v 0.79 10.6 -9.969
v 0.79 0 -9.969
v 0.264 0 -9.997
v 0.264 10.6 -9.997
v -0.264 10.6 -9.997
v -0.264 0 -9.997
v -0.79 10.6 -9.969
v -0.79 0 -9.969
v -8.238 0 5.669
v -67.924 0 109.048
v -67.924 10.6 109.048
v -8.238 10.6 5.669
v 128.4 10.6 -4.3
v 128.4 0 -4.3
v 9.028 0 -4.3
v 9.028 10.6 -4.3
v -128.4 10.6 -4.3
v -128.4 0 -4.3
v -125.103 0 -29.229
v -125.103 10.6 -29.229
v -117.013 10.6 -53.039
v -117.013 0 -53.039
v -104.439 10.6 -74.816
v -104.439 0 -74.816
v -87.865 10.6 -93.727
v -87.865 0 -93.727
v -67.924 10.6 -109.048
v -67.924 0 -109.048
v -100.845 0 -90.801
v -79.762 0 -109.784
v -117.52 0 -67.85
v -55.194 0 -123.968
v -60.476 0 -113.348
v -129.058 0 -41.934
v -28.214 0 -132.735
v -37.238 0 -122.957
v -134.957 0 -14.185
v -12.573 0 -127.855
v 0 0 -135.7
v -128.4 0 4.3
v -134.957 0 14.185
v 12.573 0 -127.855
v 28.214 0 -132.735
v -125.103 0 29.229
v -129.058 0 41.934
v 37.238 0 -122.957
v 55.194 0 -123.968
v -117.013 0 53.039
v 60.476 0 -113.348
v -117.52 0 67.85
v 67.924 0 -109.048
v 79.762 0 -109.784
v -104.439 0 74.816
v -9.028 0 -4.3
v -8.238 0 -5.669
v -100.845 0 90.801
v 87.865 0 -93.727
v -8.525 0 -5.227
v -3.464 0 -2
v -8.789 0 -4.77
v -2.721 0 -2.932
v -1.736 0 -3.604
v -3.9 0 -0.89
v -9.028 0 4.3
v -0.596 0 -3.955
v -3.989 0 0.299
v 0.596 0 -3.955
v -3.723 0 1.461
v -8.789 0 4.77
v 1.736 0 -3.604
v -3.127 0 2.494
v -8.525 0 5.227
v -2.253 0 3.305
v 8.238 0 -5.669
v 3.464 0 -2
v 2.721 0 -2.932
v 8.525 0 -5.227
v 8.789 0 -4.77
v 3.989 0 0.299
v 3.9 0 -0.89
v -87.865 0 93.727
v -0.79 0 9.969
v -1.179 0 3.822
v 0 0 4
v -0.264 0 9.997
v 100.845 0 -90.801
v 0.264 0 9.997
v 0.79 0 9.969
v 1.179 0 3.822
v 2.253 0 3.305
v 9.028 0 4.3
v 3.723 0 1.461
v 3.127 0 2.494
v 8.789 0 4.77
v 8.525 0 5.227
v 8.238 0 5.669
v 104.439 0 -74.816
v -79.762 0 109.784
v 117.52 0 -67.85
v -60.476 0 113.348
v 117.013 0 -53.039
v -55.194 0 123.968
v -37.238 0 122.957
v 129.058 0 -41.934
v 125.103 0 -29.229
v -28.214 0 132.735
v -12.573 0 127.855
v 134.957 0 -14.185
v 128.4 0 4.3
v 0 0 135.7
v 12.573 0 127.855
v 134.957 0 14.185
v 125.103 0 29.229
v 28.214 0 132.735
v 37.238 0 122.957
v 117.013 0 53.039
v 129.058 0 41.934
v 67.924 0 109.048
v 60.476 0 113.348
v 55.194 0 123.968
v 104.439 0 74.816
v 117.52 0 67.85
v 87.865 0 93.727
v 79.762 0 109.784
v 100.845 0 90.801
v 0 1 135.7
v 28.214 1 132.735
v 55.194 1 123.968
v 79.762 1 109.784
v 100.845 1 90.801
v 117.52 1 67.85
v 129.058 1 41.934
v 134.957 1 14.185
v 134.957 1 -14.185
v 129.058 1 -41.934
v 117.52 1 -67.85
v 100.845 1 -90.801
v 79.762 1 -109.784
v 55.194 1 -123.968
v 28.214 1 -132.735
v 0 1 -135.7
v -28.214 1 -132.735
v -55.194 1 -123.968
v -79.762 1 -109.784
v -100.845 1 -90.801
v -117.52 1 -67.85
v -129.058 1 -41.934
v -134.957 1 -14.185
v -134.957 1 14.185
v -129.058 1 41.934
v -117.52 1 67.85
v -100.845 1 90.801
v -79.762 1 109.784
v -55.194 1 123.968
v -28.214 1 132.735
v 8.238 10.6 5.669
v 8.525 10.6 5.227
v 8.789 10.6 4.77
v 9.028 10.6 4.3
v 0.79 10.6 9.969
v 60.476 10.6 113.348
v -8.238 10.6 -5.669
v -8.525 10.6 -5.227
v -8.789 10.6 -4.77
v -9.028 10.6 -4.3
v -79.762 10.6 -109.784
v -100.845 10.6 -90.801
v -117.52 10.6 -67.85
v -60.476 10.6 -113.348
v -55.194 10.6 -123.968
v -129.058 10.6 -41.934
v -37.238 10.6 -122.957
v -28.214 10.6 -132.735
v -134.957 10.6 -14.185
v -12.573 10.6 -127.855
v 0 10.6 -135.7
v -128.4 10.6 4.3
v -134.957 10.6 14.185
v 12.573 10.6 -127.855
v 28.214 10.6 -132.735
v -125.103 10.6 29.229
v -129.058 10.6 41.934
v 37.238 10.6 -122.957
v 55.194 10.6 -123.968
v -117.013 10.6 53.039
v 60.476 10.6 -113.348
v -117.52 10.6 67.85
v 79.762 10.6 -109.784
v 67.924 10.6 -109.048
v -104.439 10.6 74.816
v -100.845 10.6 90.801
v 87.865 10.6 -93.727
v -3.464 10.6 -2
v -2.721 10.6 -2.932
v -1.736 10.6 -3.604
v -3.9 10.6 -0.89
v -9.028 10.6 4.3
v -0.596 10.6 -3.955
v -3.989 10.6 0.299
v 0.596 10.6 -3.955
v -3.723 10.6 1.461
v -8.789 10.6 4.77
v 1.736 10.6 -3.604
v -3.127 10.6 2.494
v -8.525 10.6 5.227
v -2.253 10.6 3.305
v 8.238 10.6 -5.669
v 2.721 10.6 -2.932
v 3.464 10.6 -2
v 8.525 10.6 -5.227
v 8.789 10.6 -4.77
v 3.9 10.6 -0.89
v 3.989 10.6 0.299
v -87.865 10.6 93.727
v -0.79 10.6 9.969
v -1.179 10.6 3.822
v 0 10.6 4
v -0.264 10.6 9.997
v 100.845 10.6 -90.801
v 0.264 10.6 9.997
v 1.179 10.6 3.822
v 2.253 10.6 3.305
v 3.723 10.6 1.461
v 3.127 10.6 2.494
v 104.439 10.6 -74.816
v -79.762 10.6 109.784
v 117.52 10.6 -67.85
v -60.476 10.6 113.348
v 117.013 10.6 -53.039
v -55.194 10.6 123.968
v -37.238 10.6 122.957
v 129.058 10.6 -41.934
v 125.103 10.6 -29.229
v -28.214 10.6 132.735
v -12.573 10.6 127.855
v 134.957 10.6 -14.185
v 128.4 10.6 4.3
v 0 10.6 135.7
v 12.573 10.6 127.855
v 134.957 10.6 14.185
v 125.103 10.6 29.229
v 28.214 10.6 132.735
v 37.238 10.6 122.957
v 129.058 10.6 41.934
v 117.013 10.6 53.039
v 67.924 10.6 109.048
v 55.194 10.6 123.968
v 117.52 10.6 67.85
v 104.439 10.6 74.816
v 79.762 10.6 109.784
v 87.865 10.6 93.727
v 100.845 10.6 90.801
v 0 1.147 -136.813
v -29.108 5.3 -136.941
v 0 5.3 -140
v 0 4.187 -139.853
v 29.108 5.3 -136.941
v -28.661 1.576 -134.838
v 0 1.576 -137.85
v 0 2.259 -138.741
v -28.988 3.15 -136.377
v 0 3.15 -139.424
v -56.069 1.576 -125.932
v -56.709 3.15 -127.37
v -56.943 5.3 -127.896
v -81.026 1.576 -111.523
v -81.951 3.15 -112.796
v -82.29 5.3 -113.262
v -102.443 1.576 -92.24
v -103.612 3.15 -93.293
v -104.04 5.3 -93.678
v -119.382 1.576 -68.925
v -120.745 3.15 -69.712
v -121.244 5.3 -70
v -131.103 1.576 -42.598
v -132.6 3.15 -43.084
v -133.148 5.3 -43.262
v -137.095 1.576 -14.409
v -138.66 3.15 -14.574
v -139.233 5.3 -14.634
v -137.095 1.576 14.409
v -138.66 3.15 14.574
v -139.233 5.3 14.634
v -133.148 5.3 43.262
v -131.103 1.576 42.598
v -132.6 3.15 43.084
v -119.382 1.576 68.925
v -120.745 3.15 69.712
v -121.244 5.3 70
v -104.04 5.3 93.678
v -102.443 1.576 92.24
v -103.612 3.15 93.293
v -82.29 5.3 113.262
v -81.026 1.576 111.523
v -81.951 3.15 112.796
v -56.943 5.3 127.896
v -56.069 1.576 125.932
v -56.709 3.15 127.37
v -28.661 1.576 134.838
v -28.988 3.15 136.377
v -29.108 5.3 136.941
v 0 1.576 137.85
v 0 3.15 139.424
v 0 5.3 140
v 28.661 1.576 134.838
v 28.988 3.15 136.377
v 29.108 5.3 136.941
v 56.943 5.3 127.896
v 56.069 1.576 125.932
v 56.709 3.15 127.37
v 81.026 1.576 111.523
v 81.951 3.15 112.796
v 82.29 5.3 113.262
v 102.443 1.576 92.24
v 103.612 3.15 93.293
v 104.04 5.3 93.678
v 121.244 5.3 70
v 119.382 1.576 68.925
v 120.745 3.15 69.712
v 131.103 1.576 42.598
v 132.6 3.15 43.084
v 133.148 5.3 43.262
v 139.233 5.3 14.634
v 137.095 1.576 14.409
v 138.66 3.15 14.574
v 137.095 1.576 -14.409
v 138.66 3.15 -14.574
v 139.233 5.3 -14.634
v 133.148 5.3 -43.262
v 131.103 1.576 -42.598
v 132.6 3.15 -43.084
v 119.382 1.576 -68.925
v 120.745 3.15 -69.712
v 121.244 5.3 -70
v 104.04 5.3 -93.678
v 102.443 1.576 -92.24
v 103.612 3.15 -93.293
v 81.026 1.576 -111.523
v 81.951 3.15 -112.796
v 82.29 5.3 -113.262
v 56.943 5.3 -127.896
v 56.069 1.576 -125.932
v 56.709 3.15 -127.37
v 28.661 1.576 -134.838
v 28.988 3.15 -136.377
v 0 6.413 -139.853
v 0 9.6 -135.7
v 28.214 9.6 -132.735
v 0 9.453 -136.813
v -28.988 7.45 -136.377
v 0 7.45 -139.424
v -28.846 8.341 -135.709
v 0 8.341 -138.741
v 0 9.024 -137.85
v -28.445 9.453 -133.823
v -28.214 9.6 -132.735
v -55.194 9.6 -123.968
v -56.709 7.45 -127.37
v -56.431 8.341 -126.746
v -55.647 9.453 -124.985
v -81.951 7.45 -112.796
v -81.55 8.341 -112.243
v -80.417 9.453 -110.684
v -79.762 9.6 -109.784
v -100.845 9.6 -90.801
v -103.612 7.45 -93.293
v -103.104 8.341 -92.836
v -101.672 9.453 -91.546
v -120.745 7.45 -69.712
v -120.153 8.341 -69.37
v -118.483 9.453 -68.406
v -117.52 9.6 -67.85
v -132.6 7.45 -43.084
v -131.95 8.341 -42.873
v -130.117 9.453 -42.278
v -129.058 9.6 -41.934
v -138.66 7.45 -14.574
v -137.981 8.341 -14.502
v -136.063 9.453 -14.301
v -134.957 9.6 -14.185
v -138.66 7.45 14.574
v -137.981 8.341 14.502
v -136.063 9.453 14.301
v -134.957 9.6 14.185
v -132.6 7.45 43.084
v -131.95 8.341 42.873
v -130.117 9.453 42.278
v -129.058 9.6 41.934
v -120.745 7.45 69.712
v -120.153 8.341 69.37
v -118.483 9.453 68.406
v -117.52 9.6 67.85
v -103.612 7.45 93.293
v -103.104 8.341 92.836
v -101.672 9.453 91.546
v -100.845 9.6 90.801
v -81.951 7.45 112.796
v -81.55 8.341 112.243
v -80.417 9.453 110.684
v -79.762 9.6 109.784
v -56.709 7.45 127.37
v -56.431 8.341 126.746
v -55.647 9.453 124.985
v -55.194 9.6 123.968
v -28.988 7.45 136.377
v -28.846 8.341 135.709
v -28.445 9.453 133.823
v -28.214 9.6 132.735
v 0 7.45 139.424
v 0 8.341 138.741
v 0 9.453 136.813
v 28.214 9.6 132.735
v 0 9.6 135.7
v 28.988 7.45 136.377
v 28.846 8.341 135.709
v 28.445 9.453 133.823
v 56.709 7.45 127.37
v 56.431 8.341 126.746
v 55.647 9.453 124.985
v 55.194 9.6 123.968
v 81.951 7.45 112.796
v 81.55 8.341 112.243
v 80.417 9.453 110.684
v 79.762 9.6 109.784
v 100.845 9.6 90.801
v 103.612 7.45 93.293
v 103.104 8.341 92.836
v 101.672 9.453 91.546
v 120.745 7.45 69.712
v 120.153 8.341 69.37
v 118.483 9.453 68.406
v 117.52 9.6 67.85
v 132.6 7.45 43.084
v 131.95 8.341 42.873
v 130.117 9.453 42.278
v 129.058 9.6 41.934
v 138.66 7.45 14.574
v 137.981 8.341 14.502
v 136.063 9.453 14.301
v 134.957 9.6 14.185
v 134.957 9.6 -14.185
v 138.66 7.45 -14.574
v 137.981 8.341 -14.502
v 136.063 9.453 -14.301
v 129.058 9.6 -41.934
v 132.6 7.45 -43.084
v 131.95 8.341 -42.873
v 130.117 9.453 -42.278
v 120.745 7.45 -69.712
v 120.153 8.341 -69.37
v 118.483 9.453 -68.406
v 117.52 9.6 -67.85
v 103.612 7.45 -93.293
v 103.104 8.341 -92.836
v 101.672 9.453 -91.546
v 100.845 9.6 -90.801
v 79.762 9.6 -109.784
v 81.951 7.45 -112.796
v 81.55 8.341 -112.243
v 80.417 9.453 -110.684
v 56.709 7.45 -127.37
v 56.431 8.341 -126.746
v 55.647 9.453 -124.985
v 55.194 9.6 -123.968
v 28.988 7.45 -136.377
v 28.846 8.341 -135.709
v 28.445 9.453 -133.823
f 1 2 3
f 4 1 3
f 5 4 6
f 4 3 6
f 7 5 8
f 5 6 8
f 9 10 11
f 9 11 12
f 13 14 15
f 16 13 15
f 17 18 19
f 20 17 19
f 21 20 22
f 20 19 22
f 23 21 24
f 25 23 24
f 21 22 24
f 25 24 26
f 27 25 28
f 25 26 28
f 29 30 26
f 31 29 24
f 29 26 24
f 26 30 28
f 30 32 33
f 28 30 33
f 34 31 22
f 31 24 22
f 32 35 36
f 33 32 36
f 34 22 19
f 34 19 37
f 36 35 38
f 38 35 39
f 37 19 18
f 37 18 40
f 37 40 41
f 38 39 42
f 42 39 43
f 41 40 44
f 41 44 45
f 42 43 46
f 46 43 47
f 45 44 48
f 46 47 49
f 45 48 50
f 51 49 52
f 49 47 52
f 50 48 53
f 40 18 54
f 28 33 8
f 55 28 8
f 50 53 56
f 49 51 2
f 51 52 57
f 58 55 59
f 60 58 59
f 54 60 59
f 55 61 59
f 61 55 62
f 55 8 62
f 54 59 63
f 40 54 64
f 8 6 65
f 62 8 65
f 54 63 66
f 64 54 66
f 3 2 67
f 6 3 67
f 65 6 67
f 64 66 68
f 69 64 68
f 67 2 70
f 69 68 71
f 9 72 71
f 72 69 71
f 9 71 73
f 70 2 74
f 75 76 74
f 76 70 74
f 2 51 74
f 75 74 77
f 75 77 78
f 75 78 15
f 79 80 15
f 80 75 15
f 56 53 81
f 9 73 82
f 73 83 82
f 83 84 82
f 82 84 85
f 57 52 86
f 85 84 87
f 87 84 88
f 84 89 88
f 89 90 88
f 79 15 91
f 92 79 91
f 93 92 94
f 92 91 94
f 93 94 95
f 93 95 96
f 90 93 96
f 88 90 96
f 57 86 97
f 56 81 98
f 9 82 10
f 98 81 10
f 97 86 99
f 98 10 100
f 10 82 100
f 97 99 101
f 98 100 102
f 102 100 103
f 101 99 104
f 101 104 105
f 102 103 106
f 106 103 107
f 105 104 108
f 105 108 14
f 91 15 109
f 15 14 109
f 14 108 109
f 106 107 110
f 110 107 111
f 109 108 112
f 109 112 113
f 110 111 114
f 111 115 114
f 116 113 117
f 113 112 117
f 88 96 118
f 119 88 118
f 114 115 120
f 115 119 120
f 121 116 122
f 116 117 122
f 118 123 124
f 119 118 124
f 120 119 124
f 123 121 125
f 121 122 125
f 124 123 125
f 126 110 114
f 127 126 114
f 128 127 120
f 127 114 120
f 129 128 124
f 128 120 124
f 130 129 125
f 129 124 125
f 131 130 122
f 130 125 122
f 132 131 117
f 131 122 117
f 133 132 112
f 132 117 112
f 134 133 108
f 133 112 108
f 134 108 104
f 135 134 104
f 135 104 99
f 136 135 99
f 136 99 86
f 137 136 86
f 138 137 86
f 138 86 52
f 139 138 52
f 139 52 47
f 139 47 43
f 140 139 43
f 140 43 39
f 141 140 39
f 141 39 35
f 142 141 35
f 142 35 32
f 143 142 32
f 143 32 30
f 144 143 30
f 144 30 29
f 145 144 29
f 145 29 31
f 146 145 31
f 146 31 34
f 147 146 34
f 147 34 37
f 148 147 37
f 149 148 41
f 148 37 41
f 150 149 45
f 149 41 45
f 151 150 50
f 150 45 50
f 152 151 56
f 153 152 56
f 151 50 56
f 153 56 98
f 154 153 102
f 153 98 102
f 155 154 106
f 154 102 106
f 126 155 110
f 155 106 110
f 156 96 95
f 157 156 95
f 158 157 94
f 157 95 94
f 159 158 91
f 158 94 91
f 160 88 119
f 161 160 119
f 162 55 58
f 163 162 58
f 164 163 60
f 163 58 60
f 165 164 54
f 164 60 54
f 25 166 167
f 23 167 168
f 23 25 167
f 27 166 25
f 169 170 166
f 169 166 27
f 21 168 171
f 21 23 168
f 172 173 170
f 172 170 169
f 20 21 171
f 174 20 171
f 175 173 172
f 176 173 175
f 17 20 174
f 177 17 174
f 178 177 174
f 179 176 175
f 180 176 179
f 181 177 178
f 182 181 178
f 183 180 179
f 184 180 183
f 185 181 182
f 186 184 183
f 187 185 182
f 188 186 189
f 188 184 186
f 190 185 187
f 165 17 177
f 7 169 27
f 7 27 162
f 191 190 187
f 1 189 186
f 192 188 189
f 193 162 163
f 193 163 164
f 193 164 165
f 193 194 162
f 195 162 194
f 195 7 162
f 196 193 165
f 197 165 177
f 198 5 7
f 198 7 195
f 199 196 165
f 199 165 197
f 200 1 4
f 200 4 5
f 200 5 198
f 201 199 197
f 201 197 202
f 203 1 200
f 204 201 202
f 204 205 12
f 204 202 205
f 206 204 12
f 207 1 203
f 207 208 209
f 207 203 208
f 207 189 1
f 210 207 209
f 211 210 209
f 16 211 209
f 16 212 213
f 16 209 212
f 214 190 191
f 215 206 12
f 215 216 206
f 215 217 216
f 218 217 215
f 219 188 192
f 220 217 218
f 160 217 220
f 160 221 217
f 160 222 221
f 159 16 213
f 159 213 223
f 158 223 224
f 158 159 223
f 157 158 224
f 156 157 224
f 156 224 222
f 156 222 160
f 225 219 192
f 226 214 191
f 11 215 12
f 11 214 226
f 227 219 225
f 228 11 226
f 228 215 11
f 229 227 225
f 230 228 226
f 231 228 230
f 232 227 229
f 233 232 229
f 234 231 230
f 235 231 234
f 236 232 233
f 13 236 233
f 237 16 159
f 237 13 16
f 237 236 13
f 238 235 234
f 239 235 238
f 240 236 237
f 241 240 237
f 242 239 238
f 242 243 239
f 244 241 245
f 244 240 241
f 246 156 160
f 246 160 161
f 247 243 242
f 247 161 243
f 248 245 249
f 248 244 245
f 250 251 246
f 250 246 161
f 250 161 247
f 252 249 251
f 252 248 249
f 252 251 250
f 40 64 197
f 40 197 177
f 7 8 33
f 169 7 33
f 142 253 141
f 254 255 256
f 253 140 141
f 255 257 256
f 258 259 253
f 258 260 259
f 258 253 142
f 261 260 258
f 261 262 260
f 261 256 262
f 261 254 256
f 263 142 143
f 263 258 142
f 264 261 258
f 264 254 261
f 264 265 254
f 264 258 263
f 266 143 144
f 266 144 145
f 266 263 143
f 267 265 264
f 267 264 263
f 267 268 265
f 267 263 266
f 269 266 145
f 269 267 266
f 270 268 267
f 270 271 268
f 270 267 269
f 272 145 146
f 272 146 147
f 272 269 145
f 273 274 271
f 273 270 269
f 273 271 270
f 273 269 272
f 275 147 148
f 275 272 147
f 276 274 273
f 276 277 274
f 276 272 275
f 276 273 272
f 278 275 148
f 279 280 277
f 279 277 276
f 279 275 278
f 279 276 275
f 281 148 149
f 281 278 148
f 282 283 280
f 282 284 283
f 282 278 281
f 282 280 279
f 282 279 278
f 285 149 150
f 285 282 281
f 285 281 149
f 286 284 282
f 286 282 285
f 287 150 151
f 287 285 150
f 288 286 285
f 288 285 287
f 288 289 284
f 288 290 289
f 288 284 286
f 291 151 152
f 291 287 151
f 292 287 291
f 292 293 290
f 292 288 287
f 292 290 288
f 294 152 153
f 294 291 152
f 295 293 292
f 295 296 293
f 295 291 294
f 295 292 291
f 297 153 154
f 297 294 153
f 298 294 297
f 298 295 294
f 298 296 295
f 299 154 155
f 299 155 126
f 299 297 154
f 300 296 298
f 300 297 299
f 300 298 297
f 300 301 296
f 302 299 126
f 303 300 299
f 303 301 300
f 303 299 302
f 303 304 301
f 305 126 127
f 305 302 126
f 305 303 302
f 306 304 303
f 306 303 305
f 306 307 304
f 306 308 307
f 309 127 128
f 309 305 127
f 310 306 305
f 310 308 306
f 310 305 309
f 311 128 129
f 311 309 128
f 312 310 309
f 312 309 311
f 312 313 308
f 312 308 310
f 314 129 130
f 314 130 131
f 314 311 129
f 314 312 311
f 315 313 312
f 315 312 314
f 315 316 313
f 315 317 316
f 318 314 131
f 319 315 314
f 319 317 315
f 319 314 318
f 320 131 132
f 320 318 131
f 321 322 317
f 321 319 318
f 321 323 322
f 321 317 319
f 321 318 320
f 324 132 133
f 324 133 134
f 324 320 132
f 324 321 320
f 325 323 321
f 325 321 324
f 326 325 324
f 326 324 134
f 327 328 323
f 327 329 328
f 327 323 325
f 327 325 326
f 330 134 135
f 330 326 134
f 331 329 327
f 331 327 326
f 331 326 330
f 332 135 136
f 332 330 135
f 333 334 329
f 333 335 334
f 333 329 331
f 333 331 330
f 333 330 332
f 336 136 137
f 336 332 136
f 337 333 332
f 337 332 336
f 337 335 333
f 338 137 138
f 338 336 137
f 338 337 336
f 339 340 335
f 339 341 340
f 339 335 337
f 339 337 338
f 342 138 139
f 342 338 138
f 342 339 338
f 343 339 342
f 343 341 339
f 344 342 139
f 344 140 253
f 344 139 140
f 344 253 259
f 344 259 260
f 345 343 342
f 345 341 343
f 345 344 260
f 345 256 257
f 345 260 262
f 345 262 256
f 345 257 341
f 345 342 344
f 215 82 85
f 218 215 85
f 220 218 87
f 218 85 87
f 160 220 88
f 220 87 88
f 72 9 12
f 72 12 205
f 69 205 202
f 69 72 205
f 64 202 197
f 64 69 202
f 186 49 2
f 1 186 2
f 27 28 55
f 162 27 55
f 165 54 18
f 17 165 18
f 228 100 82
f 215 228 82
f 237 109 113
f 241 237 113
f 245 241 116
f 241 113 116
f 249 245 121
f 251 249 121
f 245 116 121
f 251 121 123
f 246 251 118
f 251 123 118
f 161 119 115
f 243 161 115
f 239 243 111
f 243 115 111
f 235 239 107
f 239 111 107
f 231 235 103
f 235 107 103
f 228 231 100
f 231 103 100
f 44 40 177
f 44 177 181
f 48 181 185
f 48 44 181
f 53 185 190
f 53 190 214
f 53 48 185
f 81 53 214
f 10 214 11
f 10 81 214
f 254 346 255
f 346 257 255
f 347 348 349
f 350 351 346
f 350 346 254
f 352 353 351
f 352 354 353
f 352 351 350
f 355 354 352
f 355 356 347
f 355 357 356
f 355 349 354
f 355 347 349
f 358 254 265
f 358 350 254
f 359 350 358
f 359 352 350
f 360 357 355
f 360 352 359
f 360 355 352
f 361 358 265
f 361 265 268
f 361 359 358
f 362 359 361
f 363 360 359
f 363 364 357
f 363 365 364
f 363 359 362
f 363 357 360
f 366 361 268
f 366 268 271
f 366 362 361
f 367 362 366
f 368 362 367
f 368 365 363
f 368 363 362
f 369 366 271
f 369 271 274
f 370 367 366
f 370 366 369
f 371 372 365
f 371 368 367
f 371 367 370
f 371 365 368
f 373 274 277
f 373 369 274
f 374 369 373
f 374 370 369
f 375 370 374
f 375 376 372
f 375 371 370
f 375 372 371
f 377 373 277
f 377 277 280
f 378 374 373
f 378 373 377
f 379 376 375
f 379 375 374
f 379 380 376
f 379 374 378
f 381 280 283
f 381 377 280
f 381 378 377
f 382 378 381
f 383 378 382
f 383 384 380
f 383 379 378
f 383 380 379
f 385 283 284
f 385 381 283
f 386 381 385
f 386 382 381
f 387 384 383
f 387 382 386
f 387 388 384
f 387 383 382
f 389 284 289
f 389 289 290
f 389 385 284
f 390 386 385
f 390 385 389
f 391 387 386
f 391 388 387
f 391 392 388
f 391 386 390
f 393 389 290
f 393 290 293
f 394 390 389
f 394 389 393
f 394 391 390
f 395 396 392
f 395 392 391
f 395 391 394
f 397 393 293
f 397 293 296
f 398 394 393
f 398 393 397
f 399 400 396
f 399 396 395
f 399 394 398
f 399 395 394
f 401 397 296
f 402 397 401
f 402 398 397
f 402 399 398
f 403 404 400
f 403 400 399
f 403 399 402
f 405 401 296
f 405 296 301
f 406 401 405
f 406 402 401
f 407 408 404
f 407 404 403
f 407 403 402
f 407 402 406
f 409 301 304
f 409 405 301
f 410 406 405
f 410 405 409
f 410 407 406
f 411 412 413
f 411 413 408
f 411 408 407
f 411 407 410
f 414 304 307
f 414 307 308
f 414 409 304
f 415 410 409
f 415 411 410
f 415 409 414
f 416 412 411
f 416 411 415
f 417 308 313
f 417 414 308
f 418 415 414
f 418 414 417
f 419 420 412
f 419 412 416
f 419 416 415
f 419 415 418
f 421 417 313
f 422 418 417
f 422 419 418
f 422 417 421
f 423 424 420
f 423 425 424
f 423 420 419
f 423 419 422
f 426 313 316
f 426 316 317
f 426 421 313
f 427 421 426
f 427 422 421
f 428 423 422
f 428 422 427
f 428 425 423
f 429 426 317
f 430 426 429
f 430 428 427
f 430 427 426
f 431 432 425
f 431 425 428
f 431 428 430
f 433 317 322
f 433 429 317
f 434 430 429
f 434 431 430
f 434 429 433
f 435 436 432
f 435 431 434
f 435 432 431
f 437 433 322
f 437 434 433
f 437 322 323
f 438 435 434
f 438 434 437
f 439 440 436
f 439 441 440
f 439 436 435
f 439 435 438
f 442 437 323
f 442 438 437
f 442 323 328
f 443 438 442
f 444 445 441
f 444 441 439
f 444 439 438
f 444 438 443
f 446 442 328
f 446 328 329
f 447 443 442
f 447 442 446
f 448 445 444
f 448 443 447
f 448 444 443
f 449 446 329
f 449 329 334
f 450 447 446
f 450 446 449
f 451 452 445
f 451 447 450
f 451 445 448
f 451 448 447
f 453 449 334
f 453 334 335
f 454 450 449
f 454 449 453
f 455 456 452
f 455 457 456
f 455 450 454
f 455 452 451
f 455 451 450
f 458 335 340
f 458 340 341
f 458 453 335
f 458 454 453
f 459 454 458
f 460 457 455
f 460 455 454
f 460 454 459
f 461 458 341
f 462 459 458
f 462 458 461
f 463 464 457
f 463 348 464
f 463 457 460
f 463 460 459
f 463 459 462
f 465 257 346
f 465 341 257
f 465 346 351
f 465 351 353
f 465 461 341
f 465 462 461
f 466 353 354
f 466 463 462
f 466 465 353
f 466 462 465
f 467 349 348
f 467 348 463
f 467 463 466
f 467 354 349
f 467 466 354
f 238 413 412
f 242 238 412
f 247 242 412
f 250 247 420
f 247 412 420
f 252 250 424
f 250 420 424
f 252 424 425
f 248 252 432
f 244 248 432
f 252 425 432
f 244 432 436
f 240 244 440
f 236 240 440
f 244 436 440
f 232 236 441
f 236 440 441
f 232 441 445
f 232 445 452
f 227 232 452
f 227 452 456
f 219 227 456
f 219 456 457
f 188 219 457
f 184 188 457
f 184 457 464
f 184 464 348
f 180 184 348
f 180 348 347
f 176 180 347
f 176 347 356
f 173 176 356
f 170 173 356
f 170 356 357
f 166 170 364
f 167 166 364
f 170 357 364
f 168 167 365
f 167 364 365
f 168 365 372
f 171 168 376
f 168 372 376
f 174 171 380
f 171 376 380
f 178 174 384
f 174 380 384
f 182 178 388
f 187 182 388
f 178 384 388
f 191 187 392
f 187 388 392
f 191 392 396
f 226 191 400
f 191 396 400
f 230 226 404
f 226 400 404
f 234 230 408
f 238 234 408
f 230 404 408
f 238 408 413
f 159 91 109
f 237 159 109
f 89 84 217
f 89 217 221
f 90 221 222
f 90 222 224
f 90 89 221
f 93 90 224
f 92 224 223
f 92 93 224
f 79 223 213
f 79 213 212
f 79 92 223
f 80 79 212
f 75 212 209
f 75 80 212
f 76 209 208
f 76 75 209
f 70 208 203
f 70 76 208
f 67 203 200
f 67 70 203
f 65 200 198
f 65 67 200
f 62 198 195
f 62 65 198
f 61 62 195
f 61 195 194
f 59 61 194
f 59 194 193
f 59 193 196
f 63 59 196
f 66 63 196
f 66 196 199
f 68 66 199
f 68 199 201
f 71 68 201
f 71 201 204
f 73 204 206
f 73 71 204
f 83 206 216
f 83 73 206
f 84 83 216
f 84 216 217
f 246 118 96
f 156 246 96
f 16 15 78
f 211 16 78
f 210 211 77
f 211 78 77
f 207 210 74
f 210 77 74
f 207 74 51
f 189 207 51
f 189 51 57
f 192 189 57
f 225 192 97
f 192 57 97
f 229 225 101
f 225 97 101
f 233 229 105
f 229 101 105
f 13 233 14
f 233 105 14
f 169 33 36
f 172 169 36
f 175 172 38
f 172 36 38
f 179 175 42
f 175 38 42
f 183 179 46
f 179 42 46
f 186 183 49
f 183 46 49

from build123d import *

# Parameters (mm, degrees)
SKETCH1_R           = 135.7
SKETCH1_R_2         = 4
BOSS_EXTRUDE1_DEPTH = 10.6
SKETCH3_R           = 4.3
SKETCH5_R           = 4.3


with BuildPart() as part:
    # Sketch1 → Boss-Extrude1 (new body)
    with BuildSketch(Plane(origin=(0, 0, 0), x_dir=(1, 0, 0), z_dir=(0, 1, 0))):
        with Locations(Location((0, 0, 0), (0, 0, 270))):
            Circle(SKETCH1_R)
        with Locations(Location((0, 0, 0), (0, 0, 270))):
            Circle(SKETCH1_R_2, mode=Mode.SUBTRACT)
        with BuildLine():
            Line((-9.028288874, 4.3), (-128.4, 4.3))
            ThreePointArc((-128.4, 4.3), (-111.259999551, 64.235990691), (-67.923909236, 109.047661846))
            Line((-67.923909236, 109.047661846), (-8.238053673, 5.668727518))
            ThreePointArc((-8.238053673, 5.668727518), (-8.660254038, 5), (-9.028288874, 4.3))
        make_face(mode=Mode.SUBTRACT)
        with BuildLine():
            Line((-9.028288874, -4.3), (-128.4, -4.3))
            ThreePointArc((-128.4, -4.3), (-111.259999551, -64.235990691), (-67.923909236, -109.047661846))
            Line((-67.923909236, -109.047661846), (-8.238053673, -5.668727518))
            ThreePointArc((-8.238053673, -5.668727518), (-8.660254038, -5), (-9.028288874, -4.3))
        make_face(mode=Mode.SUBTRACT)
        with BuildLine():
            Line((-0.790235201, 9.968727518), (-60.476090764, 113.347661846))
            ThreePointArc((-60.476090764, 113.347661846), (0, 128.471981381), (60.476090764, 113.347661846))
            Line((60.476090764, 113.347661846), (0.790235201, 9.968727518))
            ThreePointArc((0.790235201, 9.968727518), (0, 10), (-0.790235201, 9.968727518))
        make_face(mode=Mode.SUBTRACT)
        with BuildLine():
            Line((8.238053673, 5.668727518), (67.923909236, 109.047661846))
            ThreePointArc((67.923909236, 109.047661846), (111.259999551, 64.235990691), (128.4, 4.3))
            Line((128.4, 4.3), (9.028288874, 4.3))
            ThreePointArc((9.028288874, 4.3), (8.660254038, 5), (8.238053673, 5.668727518))
        make_face(mode=Mode.SUBTRACT)
        with BuildLine():
            Line((9.028288874, -4.3), (128.4, -4.3))
            ThreePointArc((128.4, -4.3), (111.259999551, -64.235990691), (67.923909236, -109.047661846))
            Line((67.923909236, -109.047661846), (8.238053673, -5.668727518))
            ThreePointArc((8.238053673, -5.668727518), (8.660254038, -5), (9.028288874, -4.3))
        make_face(mode=Mode.SUBTRACT)
        with BuildLine():
            Line((0.790235201, -9.968727518), (60.476090764, -113.347661846))
            ThreePointArc((60.476090764, -113.347661846), (0, -128.471981381), (-60.476090764, -113.347661846))
            Line((-60.476090764, -113.347661846), (-0.790235201, -9.968727518))
            ThreePointArc((-0.790235201, -9.968727518), (0, -10), (0.790235201, -9.968727518))
        make_face(mode=Mode.SUBTRACT)
    extrude(amount=BOSS_EXTRUDE1_DEPTH)

    # Sketch3 → Cut-Revolve1 (revolve, cut)
    with BuildSketch(Plane.XY, mode=Mode.PRIVATE) as cut_revolve1_sk:
        with Locations((135.7, 5.3)):
            Circle(SKETCH3_R)
    revolve(cut_revolve1_sk.sketch.rotate(Axis((0, 0, 0), (0, 1, 0)), 90), axis=Axis((0, 0, 0), (0, 1, 0)), mode=Mode.SUBTRACT)

    # Sketch5 → Revolve1 (revolve)
    with BuildSketch(Plane(origin=(0, 0, 0), x_dir=(0, 0, -1), z_dir=(1, 0, 0))):
        with Locations((135.7, 5.3)):
            Circle(SKETCH5_R)
    revolve(axis=Axis((0, 0, 0), (0, 1, 0)))


solid = part.part
